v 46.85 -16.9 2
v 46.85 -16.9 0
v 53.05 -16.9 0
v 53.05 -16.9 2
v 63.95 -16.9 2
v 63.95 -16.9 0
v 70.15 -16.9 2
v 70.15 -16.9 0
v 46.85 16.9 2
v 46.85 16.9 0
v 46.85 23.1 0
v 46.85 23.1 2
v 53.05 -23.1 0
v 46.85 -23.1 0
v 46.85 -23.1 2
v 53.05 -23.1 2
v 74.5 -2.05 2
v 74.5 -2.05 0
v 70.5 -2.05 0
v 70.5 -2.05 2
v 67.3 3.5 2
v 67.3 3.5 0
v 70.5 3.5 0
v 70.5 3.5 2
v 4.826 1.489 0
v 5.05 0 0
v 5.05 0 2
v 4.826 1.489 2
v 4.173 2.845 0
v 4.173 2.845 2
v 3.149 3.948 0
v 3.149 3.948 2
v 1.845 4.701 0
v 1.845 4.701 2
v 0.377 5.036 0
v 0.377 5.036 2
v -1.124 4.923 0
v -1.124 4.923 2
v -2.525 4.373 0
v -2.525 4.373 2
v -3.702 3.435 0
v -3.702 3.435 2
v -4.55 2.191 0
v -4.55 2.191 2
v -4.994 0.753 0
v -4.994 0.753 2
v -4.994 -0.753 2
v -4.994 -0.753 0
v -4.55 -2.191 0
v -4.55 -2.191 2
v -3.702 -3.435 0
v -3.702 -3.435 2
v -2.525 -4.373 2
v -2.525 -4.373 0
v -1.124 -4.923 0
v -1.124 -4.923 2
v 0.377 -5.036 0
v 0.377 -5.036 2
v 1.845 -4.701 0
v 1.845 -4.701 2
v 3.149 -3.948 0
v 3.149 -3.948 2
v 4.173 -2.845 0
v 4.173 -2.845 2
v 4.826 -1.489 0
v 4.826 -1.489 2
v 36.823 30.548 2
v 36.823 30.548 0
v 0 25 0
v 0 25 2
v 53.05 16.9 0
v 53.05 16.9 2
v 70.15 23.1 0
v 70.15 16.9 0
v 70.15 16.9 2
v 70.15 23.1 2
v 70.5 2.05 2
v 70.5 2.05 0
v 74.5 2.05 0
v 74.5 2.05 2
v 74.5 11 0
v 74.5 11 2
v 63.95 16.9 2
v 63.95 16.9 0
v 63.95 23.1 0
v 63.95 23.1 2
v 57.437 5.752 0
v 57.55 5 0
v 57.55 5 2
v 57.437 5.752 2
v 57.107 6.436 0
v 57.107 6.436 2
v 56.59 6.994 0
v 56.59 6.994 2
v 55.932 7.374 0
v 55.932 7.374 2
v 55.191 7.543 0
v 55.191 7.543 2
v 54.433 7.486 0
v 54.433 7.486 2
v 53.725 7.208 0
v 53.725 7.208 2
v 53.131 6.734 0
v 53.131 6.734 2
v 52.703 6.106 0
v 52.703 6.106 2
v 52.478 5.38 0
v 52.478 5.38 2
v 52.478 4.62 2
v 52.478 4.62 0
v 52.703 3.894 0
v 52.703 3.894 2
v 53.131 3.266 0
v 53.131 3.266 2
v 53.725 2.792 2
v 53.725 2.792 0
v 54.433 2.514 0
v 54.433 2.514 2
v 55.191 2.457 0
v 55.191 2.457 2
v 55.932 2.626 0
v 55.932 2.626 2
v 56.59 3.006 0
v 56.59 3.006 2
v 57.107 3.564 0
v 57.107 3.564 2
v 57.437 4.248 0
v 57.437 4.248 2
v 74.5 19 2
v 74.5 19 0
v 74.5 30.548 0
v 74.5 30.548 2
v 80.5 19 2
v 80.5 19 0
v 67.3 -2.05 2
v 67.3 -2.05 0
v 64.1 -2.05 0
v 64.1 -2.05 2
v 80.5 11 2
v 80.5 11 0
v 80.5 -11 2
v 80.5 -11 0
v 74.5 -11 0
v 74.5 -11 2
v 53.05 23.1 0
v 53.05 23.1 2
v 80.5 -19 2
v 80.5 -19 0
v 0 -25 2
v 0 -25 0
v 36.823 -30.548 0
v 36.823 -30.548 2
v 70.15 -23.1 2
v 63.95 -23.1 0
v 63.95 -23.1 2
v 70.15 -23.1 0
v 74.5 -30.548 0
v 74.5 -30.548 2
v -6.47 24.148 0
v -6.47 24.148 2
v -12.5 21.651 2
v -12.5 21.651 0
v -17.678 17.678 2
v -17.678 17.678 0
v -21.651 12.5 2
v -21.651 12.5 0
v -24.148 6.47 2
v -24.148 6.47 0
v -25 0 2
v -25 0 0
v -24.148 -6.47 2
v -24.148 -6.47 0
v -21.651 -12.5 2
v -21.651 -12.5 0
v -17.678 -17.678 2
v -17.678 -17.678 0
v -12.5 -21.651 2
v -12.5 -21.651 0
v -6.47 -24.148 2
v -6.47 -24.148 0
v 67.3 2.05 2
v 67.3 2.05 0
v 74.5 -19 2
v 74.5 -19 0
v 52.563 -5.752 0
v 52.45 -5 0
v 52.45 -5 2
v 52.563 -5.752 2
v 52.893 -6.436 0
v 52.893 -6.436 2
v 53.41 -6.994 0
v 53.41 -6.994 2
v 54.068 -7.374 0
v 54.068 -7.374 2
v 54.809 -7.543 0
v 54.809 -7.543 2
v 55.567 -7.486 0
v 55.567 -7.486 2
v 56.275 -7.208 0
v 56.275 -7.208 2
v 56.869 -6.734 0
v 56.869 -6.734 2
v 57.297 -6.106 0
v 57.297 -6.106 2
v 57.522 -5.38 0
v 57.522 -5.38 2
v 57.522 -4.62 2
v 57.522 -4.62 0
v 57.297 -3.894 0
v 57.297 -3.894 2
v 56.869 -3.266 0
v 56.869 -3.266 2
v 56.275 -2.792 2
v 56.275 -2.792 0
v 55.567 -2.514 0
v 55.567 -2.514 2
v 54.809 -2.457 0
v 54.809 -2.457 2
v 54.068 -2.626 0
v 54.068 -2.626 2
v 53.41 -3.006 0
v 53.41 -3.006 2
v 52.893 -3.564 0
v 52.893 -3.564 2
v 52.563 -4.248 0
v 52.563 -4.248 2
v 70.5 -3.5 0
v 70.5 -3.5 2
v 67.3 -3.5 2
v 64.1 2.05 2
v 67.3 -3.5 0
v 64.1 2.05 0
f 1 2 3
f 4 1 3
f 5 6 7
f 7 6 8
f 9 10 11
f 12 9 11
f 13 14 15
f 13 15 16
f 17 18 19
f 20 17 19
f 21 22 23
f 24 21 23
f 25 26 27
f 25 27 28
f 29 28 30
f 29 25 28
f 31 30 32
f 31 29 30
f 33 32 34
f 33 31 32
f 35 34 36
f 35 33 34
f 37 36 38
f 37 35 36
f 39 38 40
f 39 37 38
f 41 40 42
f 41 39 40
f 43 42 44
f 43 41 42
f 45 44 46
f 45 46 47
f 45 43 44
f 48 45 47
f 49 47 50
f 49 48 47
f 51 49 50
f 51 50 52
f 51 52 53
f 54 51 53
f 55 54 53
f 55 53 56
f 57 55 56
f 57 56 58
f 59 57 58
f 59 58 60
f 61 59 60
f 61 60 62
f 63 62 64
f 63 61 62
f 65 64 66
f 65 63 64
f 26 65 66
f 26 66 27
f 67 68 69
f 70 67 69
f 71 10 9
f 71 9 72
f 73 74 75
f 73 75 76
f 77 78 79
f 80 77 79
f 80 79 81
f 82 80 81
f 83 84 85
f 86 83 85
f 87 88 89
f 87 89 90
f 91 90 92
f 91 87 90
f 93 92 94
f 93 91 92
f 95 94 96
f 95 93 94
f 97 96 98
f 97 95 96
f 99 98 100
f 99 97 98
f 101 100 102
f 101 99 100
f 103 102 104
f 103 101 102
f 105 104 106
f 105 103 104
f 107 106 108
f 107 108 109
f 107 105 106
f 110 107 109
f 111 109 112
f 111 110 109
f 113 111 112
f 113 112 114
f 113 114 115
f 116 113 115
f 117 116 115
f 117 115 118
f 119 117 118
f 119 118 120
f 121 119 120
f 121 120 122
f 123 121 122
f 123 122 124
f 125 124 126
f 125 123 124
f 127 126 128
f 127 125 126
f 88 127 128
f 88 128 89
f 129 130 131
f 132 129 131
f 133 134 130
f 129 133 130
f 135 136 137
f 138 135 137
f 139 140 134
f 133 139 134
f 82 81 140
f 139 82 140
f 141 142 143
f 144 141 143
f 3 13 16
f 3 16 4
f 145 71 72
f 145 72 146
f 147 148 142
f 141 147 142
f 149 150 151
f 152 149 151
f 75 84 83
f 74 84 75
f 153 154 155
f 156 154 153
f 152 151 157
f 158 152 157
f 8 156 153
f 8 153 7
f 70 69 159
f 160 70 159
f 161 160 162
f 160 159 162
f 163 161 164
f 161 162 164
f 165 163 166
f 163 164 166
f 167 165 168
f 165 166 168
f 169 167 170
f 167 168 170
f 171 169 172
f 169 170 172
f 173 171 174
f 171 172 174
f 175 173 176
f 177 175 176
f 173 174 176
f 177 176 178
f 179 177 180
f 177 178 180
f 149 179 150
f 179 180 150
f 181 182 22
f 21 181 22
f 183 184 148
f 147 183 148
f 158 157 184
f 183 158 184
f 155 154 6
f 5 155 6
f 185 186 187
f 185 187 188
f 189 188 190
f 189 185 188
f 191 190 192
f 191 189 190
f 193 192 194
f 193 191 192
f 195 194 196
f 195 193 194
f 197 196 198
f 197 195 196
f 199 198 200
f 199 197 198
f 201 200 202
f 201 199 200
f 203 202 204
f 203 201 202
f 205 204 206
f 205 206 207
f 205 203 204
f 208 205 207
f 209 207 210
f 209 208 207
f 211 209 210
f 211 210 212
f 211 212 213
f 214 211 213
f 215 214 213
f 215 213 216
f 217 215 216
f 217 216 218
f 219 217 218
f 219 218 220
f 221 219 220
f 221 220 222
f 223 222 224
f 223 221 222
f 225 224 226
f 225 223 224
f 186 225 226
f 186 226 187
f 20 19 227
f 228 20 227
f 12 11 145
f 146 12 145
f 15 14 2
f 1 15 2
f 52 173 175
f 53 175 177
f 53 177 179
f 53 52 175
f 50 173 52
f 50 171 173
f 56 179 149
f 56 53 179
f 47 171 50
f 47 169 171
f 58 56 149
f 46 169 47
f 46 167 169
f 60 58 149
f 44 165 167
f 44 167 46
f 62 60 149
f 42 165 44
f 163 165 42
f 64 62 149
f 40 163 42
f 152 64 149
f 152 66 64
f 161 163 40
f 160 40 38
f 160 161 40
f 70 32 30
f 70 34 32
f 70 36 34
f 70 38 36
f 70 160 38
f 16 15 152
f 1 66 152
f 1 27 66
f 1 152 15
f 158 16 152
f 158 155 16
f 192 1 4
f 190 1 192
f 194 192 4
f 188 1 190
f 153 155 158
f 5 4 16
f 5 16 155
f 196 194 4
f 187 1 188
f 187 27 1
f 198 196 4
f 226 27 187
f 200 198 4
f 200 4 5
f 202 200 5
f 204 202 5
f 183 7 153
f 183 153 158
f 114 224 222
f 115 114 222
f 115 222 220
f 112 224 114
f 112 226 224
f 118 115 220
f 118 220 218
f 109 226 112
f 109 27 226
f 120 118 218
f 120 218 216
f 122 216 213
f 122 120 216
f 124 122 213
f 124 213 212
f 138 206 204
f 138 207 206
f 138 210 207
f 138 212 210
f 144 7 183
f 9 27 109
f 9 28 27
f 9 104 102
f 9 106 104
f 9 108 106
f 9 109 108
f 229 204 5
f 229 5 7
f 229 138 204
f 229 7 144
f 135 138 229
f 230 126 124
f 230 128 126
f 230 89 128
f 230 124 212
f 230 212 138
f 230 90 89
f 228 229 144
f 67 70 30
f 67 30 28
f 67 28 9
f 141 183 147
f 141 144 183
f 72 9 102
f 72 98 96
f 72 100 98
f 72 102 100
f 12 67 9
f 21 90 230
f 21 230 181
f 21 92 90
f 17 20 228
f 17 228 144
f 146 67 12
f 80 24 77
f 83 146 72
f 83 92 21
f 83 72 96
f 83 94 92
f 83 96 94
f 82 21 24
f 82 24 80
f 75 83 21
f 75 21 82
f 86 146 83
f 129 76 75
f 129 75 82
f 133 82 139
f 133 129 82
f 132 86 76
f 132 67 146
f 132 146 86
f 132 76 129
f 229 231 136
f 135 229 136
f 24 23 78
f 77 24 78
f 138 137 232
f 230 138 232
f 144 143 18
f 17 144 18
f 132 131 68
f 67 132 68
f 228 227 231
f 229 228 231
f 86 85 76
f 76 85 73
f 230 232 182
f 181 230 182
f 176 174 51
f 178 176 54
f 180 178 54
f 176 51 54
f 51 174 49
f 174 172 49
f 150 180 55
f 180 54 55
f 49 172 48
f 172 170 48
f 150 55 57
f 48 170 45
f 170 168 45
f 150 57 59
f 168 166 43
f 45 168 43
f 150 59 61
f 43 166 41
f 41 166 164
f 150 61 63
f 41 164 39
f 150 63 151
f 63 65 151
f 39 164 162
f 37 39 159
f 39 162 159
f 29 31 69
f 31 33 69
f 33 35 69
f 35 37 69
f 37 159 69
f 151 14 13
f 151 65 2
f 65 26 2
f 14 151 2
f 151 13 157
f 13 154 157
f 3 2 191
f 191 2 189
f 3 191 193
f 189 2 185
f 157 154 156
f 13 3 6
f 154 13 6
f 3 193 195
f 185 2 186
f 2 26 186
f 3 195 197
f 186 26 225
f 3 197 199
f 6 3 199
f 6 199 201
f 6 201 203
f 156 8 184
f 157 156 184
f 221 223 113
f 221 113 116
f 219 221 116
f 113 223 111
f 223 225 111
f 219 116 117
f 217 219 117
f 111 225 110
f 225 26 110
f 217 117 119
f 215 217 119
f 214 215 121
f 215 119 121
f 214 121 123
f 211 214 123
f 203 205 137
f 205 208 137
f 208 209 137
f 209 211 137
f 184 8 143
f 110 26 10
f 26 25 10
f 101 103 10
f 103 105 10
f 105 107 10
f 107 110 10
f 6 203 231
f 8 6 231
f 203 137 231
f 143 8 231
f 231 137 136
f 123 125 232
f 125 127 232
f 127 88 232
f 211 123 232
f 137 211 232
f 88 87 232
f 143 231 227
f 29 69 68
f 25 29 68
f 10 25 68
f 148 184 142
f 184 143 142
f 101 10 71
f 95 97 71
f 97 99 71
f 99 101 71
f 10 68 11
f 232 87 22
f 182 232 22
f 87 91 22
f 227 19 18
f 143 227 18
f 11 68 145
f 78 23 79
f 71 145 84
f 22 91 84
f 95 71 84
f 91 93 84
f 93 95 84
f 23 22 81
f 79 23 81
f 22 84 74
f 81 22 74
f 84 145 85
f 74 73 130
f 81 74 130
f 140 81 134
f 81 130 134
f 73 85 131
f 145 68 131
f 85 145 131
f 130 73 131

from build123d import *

# Parameters (mm, degrees)
SKETCH_1_R      = 5.05
SKETCH_1_R_2    = 2.55
SKETCH_1_W      = 6.2
SKETCH_1_H      = 6.2
EXTRUDE_1_DEPTH = 2


with BuildPart() as part:
    # 草图1 → 凸台-拉伸1 (new body)
    with BuildSketch(Plane.XY):
        with BuildLine():
            Line((0, -25), (36.822908512, -30.548036369))
            Line((36.822908512, -30.548036369), (74.5, -30.548036369))
            Line((74.5, -30.548036369), (74.5, -19))
            Line((74.5, -19), (80.5, -19))
            Line((80.5, -19), (80.5, -11))
            Line((80.5, -11), (74.5, -11))
            Line((74.5, -11), (74.5, -2.05))
            Line((74.5, -2.05), (70.5, -2.05))
            Line((70.5, -2.05), (70.5, -3.5))
            Line((70.5, -3.5), (67.3, -3.5))
            Line((67.3, -3.5), (67.3, -2.05))
            Line((67.3, -2.05), (64.1, -2.05))
            Line((64.1, -2.05), (64.1, 2.05))
            Line((64.1, 2.05), (67.3, 2.05))
            Line((67.3, 2.05), (67.3, 3.5))
            Line((67.3, 3.5), (70.5, 3.5))
            Line((70.5, 3.5), (70.5, 2.05))
            Line((70.5, 2.05), (74.5, 2.05))
            Line((74.5, 2.05), (74.5, 11))
            Line((74.5, 11), (80.5, 11))
            Line((80.5, 11), (80.5, 19))
            Line((80.5, 19), (74.5, 19))
            Line((74.5, 19), (74.5, 30.548036369))
            Line((74.5, 30.548036369), (36.822908512, 30.548036369))
            Line((36.822908512, 30.548036369), (0, 25))
            ThreePointArc((0, 25), (-25, 0), (0, -25))
        make_face()
        Circle(SKETCH_1_R, mode=Mode.SUBTRACT)
        with Locations((55, 5)):
            Circle(SKETCH_1_R_2, mode=Mode.SUBTRACT)
        with Locations(Location((55, -5, 0), (0, 0, 180))):
            Circle(SKETCH_1_R_2, mode=Mode.SUBTRACT)
        with Locations((67.05, -20)):
            Rectangle(SKETCH_1_W, SKETCH_1_H, mode=Mode.SUBTRACT)
        with Locations((49.95, -20)):
            Rectangle(SKETCH_1_W, SKETCH_1_H, mode=Mode.SUBTRACT)
        with Locations((49.95, 20)):
            Rectangle(SKETCH_1_W, SKETCH_1_H, mode=Mode.SUBTRACT)
        with Locations((67.05, 20)):
            Rectangle(SKETCH_1_W, SKETCH_1_H, mode=Mode.SUBTRACT)
    extrude(amount=EXTRUDE_1_DEPTH)


solid = part.part
